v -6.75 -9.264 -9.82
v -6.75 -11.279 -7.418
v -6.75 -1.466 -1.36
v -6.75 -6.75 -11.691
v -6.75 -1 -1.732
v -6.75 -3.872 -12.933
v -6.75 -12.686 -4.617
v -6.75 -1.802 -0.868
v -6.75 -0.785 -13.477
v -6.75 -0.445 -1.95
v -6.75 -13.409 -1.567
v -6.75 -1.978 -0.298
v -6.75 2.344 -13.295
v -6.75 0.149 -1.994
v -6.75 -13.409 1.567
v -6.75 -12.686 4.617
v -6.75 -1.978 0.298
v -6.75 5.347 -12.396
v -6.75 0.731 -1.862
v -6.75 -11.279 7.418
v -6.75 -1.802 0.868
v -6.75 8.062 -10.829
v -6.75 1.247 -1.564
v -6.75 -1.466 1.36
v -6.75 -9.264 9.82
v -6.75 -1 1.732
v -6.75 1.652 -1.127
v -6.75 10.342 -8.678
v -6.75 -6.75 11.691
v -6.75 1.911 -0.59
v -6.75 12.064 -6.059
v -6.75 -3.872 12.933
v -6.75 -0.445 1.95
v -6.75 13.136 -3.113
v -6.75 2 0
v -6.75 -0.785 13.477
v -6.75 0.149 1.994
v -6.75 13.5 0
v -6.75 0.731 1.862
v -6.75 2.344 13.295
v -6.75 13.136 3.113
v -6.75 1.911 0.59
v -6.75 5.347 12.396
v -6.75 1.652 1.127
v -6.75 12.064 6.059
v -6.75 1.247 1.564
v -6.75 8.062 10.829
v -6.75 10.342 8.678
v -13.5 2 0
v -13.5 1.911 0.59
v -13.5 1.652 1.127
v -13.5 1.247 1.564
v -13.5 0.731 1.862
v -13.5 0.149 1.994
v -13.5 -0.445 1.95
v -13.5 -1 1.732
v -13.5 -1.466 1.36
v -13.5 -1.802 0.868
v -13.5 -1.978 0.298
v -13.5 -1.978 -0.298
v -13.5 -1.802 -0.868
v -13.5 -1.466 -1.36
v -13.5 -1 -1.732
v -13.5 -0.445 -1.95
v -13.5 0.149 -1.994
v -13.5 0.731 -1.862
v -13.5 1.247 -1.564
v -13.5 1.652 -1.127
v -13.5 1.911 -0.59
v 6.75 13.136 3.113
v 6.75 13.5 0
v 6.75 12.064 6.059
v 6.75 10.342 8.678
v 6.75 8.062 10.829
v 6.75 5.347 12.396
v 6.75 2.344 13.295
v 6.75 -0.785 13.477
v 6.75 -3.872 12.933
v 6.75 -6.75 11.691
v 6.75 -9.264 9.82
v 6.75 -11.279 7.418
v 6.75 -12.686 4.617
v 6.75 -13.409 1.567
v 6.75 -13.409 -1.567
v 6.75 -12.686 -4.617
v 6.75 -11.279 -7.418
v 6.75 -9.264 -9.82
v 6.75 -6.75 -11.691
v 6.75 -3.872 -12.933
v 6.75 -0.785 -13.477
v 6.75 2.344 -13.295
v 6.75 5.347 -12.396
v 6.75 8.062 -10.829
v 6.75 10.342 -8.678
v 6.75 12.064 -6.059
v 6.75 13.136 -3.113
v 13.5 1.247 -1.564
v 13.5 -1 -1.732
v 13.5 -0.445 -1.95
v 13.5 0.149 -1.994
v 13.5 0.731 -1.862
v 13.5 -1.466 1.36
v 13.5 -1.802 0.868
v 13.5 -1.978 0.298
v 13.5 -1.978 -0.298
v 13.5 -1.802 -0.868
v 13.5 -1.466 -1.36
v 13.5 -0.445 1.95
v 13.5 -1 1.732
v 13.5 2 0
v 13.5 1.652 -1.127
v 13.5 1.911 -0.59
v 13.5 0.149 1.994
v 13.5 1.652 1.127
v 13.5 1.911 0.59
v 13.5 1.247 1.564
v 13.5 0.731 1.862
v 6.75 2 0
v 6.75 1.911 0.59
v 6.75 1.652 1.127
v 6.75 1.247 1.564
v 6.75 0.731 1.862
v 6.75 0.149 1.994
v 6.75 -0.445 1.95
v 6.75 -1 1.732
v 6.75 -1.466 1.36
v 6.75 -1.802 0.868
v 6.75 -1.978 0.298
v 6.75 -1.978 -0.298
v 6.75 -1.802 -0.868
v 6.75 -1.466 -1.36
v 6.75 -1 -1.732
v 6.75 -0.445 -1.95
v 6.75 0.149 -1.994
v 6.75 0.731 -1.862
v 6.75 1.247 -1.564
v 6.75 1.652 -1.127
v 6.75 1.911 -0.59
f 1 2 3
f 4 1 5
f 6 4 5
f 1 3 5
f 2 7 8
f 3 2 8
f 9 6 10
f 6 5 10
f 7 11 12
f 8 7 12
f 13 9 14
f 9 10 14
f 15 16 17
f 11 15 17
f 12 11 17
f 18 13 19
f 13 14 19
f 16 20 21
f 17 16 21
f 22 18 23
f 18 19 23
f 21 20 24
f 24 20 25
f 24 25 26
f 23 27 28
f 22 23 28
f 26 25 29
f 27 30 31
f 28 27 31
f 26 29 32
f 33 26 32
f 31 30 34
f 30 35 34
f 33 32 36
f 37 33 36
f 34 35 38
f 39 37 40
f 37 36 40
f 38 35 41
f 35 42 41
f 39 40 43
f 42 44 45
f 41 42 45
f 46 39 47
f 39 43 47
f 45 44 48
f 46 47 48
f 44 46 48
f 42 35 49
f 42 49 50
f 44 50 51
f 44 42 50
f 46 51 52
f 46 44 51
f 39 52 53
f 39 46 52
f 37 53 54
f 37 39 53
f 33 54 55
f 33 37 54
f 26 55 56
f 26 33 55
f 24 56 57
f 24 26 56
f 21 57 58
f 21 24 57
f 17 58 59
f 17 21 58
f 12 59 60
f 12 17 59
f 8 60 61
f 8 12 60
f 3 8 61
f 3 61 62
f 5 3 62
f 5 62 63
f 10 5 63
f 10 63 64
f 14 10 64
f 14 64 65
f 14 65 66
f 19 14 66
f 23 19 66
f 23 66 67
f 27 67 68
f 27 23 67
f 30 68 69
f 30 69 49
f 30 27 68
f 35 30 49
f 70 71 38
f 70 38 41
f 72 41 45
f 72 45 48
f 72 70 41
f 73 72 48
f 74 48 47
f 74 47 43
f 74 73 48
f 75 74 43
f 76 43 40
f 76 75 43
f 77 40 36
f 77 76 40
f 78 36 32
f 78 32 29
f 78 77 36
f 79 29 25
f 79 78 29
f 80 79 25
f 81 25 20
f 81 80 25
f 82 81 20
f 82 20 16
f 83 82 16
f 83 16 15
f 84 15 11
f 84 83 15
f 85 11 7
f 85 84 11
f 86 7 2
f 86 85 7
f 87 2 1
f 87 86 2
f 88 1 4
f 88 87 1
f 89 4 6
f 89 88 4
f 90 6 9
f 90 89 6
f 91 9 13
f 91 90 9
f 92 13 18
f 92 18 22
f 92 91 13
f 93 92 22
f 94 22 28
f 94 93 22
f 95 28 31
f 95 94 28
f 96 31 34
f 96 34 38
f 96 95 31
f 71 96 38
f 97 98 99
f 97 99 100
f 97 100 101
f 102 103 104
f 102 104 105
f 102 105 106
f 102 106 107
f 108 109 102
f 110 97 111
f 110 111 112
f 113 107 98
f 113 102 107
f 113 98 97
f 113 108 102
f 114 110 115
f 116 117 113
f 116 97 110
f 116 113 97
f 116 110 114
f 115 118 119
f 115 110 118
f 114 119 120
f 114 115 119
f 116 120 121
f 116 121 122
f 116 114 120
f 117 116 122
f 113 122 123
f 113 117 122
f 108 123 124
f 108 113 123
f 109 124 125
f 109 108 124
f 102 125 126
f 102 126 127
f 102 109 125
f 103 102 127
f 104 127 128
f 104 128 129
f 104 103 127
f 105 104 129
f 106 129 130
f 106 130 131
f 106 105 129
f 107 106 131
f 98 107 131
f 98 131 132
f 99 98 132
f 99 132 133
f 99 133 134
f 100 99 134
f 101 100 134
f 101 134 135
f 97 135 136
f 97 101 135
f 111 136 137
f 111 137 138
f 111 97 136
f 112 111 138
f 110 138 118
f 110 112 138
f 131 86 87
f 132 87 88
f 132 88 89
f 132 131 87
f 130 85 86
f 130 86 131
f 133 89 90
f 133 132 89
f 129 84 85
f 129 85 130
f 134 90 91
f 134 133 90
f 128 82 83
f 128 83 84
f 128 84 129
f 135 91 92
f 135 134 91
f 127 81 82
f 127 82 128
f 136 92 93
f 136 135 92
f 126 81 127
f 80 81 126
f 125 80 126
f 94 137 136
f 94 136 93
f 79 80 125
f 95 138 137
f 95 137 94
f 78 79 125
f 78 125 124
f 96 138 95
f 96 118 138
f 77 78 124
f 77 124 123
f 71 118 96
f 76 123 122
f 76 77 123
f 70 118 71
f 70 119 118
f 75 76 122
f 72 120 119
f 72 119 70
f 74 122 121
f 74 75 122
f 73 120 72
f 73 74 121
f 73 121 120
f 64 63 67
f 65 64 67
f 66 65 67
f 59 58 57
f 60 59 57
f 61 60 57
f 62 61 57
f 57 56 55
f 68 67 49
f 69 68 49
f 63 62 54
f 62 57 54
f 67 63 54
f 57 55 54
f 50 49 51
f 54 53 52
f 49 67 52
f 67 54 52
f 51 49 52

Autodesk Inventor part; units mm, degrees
sketch "Sketch_1" plane through (0, 0, 0) normal (0, 0, 1) x (1, 0, 0)
  line L0 (50, 0) -> (-50, 0)
  line L1 (-13.5, 0) -> (-13.5, 2)
  line L2 (-13.5, 2) -> (-6.75, 2)
  line L3 (-6.75, 2) -> (-6.75, 13.5)
  line L4 (-6.75, 13.5) -> (6.75, 13.5)
  line L5 (6.75, 13.5) -> (6.75, 2)
  line L6 (6.75, 2) -> (13.5, 2)
  line L7 (13.5, 2) -> (13.5, 0)
  line L8 (13.5, 0) -> (-13.5, 0)
revolve "Revolution1" add sketch "Sketch_1" angle 360 about axis through (50, 0, 0) along (1, 0, 0)
ref_plane "p1_XY" through (0, 0, 0) normal (1, 0, 0) x (0, 0, -1)
ref_plane "p1_YZ" through (0, 0, 0) normal (0, 0, -1) x (0, 1, 0)
ref_plane "p1_ZX" through (0, 0, 0) normal (0, 1, 0) x (1, 0, 0)
properties part number "PRO10314 Rollenleiste Grundteil"
